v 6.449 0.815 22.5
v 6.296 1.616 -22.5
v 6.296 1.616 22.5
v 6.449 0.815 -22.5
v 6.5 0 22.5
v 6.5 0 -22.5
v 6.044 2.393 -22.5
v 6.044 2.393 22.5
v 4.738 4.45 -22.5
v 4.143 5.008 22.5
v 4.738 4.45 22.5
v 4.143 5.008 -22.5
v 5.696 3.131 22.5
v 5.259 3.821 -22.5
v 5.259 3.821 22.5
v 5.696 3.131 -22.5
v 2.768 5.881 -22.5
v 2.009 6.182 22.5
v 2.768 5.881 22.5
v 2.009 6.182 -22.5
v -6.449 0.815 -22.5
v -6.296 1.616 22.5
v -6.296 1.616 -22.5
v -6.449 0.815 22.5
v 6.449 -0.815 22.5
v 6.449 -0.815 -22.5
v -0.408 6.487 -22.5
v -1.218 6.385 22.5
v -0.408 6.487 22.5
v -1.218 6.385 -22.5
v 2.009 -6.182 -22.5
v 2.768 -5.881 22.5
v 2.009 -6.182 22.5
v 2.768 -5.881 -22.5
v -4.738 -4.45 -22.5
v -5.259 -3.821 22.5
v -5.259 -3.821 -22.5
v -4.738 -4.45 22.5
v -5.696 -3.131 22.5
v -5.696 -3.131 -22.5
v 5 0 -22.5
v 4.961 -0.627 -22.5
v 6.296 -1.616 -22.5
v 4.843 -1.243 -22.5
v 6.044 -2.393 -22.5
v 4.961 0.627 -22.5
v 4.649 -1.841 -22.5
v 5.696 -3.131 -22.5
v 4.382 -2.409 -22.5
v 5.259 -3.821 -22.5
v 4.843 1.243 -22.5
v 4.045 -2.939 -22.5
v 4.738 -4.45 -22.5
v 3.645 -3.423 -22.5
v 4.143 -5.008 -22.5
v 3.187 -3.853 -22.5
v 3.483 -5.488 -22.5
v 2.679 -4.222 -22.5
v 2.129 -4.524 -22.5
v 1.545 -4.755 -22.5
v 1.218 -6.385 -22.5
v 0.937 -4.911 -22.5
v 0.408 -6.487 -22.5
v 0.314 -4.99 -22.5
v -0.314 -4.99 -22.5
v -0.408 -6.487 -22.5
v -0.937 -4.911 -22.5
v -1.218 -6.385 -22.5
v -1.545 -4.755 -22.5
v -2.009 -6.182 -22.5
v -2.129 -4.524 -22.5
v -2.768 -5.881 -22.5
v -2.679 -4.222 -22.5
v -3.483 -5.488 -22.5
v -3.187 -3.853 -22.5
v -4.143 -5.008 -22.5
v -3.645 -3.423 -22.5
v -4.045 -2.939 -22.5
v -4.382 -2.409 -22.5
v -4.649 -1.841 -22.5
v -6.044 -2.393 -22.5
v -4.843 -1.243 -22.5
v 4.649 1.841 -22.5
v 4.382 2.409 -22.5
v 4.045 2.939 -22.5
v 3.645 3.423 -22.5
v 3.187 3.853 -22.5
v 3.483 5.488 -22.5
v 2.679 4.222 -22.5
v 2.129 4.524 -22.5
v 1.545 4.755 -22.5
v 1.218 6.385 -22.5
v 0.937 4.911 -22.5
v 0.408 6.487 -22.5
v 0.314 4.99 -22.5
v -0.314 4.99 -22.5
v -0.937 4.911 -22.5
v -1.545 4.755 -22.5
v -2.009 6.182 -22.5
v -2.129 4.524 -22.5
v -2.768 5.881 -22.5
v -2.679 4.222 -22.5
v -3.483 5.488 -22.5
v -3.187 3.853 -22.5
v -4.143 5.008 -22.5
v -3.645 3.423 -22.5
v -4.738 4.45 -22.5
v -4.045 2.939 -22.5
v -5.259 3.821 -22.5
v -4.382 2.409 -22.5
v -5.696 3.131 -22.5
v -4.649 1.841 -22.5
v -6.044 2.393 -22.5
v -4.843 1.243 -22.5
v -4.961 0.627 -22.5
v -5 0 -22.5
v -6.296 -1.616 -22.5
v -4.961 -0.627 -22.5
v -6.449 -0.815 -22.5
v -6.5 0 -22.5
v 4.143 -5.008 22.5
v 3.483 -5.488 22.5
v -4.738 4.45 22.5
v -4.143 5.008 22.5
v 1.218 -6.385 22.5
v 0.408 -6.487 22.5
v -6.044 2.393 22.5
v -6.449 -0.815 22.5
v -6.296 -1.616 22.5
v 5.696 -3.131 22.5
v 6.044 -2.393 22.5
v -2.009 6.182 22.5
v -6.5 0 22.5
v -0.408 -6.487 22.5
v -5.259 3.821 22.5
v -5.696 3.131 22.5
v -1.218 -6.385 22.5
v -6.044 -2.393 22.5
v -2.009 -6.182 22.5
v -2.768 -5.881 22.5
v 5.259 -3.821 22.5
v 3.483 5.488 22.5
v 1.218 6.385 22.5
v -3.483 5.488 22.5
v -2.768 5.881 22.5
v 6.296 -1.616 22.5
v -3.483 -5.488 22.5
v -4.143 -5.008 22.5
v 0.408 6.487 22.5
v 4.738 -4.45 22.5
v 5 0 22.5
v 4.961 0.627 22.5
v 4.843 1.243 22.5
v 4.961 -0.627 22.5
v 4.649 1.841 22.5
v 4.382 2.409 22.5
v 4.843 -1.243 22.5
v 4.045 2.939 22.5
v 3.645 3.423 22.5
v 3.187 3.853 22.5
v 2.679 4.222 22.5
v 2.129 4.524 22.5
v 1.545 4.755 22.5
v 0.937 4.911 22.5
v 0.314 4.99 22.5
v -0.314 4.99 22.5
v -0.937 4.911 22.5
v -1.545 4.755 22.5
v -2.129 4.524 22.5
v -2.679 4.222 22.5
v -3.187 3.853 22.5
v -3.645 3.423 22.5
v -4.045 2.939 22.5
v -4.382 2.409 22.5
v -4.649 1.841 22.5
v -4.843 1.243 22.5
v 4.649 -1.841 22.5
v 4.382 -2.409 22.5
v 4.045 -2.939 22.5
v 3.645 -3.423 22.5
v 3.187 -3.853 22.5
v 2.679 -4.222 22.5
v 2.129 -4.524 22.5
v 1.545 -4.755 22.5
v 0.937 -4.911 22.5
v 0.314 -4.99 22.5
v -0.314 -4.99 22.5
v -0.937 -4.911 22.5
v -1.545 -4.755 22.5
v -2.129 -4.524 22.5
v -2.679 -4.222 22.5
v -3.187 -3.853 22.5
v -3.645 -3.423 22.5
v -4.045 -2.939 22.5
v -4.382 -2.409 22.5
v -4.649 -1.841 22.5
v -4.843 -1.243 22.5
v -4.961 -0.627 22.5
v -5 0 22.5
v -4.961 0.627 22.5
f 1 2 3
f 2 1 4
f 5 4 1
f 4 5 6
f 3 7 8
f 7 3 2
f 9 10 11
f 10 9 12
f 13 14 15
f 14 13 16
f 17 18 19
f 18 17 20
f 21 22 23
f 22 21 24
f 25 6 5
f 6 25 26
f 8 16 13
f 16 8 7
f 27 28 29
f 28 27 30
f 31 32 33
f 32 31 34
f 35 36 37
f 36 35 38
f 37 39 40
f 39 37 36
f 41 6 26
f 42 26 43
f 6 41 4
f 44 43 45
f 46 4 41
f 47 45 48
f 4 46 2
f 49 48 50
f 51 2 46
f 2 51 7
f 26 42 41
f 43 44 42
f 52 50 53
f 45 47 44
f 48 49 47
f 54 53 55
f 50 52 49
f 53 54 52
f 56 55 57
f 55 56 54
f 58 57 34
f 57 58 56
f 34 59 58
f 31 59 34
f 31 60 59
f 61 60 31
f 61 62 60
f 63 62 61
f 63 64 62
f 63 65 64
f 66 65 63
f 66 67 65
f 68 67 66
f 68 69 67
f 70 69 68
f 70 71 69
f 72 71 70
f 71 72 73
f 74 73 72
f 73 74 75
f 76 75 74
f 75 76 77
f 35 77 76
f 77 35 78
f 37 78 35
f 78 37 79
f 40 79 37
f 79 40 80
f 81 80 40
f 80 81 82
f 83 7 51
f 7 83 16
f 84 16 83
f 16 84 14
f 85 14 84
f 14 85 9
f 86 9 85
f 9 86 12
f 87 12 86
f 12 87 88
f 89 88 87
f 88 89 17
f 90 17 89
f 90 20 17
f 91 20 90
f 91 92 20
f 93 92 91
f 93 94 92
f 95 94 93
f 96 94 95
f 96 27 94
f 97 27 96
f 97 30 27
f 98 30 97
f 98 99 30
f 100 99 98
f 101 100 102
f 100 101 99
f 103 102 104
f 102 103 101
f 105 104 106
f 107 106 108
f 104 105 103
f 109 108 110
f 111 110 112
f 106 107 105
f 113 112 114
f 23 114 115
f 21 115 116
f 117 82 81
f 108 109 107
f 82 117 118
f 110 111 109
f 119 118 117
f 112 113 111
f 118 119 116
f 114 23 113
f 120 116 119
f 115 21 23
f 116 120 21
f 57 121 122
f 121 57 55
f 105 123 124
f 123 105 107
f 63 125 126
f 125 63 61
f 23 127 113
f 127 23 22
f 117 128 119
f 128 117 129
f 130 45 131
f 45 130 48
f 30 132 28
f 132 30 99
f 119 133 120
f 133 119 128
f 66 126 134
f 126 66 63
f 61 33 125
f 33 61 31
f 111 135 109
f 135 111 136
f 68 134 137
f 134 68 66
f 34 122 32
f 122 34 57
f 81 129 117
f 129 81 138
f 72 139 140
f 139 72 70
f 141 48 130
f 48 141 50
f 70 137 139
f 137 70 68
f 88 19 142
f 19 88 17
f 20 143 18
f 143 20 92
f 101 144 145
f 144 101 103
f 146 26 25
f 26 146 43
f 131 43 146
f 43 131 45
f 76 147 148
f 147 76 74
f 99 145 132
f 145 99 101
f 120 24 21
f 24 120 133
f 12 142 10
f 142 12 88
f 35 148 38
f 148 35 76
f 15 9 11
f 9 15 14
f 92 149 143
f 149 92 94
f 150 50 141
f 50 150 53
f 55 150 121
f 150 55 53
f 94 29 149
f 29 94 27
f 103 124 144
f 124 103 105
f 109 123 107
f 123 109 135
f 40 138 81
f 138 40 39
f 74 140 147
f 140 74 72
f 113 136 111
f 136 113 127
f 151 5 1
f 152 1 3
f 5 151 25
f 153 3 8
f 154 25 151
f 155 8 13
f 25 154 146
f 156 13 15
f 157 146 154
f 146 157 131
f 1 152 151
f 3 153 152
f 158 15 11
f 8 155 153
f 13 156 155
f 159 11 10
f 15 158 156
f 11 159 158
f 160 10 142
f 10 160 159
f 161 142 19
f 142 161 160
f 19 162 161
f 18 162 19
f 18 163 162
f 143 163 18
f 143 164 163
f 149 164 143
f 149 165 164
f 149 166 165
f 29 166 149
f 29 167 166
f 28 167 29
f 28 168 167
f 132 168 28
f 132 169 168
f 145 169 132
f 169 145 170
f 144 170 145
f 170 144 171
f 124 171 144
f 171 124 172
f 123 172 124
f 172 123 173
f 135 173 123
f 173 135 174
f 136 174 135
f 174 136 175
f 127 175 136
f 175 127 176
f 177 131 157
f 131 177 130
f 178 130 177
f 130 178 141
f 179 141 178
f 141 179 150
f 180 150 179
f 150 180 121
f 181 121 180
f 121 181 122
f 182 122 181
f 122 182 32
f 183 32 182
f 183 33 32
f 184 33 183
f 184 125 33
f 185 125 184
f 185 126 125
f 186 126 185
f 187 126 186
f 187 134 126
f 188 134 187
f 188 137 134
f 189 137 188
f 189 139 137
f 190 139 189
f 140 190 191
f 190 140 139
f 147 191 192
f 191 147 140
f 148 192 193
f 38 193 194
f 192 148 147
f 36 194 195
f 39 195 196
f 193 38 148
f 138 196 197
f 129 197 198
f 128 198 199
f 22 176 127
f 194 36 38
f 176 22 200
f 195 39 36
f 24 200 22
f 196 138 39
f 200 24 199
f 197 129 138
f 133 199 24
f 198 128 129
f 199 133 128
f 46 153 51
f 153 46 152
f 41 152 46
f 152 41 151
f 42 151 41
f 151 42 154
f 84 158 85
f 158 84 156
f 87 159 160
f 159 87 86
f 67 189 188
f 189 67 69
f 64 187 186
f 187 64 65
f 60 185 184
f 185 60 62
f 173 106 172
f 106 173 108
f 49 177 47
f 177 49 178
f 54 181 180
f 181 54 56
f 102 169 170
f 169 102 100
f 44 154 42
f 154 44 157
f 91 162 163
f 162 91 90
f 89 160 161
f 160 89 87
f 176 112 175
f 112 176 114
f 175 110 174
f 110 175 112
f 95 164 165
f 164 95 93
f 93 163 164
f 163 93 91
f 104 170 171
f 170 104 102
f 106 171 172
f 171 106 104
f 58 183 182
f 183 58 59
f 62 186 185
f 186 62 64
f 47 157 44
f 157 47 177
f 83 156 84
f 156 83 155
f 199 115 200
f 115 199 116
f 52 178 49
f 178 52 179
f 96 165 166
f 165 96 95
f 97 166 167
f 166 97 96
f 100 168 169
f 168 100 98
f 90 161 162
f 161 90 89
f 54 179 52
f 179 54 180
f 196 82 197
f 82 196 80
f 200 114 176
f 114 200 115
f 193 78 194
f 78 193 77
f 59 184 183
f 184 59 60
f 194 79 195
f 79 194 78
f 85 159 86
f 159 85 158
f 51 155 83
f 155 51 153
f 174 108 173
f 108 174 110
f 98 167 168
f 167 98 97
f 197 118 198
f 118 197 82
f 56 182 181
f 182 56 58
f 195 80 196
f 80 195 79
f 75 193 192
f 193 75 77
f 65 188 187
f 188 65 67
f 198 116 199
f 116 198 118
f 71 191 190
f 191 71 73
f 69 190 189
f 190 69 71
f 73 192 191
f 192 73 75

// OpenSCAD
$fn = 50;


difference() {
	union() {
		translate(v = [0, 0, -22.5000000000]) {
			cylinder(h = 45, r = 6.5000000000);
		}
	}
	union() {
		translate(v = [0, 0, -100.0000000000]) {
			cylinder(h = 200, r = 5.0000000000);
		}
	}
}
